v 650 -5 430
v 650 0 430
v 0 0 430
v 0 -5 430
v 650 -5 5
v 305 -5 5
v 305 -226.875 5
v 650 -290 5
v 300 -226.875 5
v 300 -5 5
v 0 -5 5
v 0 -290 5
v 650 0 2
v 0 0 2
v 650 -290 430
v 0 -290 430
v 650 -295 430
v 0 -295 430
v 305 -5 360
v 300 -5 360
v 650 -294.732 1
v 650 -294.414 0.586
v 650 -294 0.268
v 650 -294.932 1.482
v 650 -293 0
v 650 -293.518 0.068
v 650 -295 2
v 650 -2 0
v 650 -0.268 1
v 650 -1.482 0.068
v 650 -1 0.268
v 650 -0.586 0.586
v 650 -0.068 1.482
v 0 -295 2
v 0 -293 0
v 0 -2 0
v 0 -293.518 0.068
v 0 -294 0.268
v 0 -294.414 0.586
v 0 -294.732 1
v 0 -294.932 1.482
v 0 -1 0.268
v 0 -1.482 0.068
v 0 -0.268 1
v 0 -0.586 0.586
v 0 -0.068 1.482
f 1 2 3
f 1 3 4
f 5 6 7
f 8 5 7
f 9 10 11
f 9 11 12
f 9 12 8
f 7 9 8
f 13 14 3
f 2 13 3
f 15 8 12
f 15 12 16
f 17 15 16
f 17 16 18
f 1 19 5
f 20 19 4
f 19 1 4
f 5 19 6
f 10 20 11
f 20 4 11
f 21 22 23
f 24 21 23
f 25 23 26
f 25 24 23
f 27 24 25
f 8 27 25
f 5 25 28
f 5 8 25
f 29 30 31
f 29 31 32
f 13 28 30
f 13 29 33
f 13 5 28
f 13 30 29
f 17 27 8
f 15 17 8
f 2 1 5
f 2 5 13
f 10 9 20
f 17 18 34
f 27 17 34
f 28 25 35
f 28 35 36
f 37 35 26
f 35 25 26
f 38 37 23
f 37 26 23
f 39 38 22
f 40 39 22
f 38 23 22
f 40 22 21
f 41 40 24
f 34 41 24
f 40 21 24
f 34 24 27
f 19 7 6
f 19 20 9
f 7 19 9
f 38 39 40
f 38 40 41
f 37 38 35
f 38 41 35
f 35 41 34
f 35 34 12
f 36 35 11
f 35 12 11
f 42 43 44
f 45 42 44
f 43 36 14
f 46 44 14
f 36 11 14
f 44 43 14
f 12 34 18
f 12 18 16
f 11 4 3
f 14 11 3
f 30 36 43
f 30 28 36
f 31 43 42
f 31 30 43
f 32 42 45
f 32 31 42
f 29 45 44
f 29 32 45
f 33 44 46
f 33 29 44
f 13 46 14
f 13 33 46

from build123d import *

# Parameters (mm, degrees)
F1_DEPTH = 650
F4_DEPTH = 5
F5_R     = 2


# Not quite as in the source:
# - a feature names something its author has since deleted; it is built from what else it names


with BuildPart() as f1:
    # F0 (on Right) → F1 (new body)
    with BuildSketch(Plane.YZ):
        Polygon((-295, 0), (0, 0), (0, 430), (-5, 430), (-5, 5), (-290, 5), (-290, 430), (-295, 430), align=None)
    extrude(amount=F1_DEPTH)

    # F3 (on offset) → F4 (join)
    with BuildSketch(Plane.YZ.offset(300)):
        Polygon((-230, 0), (-5, 0), (-5, 360), align=None)
    extrude(amount=F4_DEPTH)

    # F5
    f5_edges = [f1.edges().sort_by_distance(p)[0] for p in [
        (325, 0, 0),
        (325, -295, 0),
    ]]
    fillet(f5_edges, radius=F5_R)


solid = f1.part
